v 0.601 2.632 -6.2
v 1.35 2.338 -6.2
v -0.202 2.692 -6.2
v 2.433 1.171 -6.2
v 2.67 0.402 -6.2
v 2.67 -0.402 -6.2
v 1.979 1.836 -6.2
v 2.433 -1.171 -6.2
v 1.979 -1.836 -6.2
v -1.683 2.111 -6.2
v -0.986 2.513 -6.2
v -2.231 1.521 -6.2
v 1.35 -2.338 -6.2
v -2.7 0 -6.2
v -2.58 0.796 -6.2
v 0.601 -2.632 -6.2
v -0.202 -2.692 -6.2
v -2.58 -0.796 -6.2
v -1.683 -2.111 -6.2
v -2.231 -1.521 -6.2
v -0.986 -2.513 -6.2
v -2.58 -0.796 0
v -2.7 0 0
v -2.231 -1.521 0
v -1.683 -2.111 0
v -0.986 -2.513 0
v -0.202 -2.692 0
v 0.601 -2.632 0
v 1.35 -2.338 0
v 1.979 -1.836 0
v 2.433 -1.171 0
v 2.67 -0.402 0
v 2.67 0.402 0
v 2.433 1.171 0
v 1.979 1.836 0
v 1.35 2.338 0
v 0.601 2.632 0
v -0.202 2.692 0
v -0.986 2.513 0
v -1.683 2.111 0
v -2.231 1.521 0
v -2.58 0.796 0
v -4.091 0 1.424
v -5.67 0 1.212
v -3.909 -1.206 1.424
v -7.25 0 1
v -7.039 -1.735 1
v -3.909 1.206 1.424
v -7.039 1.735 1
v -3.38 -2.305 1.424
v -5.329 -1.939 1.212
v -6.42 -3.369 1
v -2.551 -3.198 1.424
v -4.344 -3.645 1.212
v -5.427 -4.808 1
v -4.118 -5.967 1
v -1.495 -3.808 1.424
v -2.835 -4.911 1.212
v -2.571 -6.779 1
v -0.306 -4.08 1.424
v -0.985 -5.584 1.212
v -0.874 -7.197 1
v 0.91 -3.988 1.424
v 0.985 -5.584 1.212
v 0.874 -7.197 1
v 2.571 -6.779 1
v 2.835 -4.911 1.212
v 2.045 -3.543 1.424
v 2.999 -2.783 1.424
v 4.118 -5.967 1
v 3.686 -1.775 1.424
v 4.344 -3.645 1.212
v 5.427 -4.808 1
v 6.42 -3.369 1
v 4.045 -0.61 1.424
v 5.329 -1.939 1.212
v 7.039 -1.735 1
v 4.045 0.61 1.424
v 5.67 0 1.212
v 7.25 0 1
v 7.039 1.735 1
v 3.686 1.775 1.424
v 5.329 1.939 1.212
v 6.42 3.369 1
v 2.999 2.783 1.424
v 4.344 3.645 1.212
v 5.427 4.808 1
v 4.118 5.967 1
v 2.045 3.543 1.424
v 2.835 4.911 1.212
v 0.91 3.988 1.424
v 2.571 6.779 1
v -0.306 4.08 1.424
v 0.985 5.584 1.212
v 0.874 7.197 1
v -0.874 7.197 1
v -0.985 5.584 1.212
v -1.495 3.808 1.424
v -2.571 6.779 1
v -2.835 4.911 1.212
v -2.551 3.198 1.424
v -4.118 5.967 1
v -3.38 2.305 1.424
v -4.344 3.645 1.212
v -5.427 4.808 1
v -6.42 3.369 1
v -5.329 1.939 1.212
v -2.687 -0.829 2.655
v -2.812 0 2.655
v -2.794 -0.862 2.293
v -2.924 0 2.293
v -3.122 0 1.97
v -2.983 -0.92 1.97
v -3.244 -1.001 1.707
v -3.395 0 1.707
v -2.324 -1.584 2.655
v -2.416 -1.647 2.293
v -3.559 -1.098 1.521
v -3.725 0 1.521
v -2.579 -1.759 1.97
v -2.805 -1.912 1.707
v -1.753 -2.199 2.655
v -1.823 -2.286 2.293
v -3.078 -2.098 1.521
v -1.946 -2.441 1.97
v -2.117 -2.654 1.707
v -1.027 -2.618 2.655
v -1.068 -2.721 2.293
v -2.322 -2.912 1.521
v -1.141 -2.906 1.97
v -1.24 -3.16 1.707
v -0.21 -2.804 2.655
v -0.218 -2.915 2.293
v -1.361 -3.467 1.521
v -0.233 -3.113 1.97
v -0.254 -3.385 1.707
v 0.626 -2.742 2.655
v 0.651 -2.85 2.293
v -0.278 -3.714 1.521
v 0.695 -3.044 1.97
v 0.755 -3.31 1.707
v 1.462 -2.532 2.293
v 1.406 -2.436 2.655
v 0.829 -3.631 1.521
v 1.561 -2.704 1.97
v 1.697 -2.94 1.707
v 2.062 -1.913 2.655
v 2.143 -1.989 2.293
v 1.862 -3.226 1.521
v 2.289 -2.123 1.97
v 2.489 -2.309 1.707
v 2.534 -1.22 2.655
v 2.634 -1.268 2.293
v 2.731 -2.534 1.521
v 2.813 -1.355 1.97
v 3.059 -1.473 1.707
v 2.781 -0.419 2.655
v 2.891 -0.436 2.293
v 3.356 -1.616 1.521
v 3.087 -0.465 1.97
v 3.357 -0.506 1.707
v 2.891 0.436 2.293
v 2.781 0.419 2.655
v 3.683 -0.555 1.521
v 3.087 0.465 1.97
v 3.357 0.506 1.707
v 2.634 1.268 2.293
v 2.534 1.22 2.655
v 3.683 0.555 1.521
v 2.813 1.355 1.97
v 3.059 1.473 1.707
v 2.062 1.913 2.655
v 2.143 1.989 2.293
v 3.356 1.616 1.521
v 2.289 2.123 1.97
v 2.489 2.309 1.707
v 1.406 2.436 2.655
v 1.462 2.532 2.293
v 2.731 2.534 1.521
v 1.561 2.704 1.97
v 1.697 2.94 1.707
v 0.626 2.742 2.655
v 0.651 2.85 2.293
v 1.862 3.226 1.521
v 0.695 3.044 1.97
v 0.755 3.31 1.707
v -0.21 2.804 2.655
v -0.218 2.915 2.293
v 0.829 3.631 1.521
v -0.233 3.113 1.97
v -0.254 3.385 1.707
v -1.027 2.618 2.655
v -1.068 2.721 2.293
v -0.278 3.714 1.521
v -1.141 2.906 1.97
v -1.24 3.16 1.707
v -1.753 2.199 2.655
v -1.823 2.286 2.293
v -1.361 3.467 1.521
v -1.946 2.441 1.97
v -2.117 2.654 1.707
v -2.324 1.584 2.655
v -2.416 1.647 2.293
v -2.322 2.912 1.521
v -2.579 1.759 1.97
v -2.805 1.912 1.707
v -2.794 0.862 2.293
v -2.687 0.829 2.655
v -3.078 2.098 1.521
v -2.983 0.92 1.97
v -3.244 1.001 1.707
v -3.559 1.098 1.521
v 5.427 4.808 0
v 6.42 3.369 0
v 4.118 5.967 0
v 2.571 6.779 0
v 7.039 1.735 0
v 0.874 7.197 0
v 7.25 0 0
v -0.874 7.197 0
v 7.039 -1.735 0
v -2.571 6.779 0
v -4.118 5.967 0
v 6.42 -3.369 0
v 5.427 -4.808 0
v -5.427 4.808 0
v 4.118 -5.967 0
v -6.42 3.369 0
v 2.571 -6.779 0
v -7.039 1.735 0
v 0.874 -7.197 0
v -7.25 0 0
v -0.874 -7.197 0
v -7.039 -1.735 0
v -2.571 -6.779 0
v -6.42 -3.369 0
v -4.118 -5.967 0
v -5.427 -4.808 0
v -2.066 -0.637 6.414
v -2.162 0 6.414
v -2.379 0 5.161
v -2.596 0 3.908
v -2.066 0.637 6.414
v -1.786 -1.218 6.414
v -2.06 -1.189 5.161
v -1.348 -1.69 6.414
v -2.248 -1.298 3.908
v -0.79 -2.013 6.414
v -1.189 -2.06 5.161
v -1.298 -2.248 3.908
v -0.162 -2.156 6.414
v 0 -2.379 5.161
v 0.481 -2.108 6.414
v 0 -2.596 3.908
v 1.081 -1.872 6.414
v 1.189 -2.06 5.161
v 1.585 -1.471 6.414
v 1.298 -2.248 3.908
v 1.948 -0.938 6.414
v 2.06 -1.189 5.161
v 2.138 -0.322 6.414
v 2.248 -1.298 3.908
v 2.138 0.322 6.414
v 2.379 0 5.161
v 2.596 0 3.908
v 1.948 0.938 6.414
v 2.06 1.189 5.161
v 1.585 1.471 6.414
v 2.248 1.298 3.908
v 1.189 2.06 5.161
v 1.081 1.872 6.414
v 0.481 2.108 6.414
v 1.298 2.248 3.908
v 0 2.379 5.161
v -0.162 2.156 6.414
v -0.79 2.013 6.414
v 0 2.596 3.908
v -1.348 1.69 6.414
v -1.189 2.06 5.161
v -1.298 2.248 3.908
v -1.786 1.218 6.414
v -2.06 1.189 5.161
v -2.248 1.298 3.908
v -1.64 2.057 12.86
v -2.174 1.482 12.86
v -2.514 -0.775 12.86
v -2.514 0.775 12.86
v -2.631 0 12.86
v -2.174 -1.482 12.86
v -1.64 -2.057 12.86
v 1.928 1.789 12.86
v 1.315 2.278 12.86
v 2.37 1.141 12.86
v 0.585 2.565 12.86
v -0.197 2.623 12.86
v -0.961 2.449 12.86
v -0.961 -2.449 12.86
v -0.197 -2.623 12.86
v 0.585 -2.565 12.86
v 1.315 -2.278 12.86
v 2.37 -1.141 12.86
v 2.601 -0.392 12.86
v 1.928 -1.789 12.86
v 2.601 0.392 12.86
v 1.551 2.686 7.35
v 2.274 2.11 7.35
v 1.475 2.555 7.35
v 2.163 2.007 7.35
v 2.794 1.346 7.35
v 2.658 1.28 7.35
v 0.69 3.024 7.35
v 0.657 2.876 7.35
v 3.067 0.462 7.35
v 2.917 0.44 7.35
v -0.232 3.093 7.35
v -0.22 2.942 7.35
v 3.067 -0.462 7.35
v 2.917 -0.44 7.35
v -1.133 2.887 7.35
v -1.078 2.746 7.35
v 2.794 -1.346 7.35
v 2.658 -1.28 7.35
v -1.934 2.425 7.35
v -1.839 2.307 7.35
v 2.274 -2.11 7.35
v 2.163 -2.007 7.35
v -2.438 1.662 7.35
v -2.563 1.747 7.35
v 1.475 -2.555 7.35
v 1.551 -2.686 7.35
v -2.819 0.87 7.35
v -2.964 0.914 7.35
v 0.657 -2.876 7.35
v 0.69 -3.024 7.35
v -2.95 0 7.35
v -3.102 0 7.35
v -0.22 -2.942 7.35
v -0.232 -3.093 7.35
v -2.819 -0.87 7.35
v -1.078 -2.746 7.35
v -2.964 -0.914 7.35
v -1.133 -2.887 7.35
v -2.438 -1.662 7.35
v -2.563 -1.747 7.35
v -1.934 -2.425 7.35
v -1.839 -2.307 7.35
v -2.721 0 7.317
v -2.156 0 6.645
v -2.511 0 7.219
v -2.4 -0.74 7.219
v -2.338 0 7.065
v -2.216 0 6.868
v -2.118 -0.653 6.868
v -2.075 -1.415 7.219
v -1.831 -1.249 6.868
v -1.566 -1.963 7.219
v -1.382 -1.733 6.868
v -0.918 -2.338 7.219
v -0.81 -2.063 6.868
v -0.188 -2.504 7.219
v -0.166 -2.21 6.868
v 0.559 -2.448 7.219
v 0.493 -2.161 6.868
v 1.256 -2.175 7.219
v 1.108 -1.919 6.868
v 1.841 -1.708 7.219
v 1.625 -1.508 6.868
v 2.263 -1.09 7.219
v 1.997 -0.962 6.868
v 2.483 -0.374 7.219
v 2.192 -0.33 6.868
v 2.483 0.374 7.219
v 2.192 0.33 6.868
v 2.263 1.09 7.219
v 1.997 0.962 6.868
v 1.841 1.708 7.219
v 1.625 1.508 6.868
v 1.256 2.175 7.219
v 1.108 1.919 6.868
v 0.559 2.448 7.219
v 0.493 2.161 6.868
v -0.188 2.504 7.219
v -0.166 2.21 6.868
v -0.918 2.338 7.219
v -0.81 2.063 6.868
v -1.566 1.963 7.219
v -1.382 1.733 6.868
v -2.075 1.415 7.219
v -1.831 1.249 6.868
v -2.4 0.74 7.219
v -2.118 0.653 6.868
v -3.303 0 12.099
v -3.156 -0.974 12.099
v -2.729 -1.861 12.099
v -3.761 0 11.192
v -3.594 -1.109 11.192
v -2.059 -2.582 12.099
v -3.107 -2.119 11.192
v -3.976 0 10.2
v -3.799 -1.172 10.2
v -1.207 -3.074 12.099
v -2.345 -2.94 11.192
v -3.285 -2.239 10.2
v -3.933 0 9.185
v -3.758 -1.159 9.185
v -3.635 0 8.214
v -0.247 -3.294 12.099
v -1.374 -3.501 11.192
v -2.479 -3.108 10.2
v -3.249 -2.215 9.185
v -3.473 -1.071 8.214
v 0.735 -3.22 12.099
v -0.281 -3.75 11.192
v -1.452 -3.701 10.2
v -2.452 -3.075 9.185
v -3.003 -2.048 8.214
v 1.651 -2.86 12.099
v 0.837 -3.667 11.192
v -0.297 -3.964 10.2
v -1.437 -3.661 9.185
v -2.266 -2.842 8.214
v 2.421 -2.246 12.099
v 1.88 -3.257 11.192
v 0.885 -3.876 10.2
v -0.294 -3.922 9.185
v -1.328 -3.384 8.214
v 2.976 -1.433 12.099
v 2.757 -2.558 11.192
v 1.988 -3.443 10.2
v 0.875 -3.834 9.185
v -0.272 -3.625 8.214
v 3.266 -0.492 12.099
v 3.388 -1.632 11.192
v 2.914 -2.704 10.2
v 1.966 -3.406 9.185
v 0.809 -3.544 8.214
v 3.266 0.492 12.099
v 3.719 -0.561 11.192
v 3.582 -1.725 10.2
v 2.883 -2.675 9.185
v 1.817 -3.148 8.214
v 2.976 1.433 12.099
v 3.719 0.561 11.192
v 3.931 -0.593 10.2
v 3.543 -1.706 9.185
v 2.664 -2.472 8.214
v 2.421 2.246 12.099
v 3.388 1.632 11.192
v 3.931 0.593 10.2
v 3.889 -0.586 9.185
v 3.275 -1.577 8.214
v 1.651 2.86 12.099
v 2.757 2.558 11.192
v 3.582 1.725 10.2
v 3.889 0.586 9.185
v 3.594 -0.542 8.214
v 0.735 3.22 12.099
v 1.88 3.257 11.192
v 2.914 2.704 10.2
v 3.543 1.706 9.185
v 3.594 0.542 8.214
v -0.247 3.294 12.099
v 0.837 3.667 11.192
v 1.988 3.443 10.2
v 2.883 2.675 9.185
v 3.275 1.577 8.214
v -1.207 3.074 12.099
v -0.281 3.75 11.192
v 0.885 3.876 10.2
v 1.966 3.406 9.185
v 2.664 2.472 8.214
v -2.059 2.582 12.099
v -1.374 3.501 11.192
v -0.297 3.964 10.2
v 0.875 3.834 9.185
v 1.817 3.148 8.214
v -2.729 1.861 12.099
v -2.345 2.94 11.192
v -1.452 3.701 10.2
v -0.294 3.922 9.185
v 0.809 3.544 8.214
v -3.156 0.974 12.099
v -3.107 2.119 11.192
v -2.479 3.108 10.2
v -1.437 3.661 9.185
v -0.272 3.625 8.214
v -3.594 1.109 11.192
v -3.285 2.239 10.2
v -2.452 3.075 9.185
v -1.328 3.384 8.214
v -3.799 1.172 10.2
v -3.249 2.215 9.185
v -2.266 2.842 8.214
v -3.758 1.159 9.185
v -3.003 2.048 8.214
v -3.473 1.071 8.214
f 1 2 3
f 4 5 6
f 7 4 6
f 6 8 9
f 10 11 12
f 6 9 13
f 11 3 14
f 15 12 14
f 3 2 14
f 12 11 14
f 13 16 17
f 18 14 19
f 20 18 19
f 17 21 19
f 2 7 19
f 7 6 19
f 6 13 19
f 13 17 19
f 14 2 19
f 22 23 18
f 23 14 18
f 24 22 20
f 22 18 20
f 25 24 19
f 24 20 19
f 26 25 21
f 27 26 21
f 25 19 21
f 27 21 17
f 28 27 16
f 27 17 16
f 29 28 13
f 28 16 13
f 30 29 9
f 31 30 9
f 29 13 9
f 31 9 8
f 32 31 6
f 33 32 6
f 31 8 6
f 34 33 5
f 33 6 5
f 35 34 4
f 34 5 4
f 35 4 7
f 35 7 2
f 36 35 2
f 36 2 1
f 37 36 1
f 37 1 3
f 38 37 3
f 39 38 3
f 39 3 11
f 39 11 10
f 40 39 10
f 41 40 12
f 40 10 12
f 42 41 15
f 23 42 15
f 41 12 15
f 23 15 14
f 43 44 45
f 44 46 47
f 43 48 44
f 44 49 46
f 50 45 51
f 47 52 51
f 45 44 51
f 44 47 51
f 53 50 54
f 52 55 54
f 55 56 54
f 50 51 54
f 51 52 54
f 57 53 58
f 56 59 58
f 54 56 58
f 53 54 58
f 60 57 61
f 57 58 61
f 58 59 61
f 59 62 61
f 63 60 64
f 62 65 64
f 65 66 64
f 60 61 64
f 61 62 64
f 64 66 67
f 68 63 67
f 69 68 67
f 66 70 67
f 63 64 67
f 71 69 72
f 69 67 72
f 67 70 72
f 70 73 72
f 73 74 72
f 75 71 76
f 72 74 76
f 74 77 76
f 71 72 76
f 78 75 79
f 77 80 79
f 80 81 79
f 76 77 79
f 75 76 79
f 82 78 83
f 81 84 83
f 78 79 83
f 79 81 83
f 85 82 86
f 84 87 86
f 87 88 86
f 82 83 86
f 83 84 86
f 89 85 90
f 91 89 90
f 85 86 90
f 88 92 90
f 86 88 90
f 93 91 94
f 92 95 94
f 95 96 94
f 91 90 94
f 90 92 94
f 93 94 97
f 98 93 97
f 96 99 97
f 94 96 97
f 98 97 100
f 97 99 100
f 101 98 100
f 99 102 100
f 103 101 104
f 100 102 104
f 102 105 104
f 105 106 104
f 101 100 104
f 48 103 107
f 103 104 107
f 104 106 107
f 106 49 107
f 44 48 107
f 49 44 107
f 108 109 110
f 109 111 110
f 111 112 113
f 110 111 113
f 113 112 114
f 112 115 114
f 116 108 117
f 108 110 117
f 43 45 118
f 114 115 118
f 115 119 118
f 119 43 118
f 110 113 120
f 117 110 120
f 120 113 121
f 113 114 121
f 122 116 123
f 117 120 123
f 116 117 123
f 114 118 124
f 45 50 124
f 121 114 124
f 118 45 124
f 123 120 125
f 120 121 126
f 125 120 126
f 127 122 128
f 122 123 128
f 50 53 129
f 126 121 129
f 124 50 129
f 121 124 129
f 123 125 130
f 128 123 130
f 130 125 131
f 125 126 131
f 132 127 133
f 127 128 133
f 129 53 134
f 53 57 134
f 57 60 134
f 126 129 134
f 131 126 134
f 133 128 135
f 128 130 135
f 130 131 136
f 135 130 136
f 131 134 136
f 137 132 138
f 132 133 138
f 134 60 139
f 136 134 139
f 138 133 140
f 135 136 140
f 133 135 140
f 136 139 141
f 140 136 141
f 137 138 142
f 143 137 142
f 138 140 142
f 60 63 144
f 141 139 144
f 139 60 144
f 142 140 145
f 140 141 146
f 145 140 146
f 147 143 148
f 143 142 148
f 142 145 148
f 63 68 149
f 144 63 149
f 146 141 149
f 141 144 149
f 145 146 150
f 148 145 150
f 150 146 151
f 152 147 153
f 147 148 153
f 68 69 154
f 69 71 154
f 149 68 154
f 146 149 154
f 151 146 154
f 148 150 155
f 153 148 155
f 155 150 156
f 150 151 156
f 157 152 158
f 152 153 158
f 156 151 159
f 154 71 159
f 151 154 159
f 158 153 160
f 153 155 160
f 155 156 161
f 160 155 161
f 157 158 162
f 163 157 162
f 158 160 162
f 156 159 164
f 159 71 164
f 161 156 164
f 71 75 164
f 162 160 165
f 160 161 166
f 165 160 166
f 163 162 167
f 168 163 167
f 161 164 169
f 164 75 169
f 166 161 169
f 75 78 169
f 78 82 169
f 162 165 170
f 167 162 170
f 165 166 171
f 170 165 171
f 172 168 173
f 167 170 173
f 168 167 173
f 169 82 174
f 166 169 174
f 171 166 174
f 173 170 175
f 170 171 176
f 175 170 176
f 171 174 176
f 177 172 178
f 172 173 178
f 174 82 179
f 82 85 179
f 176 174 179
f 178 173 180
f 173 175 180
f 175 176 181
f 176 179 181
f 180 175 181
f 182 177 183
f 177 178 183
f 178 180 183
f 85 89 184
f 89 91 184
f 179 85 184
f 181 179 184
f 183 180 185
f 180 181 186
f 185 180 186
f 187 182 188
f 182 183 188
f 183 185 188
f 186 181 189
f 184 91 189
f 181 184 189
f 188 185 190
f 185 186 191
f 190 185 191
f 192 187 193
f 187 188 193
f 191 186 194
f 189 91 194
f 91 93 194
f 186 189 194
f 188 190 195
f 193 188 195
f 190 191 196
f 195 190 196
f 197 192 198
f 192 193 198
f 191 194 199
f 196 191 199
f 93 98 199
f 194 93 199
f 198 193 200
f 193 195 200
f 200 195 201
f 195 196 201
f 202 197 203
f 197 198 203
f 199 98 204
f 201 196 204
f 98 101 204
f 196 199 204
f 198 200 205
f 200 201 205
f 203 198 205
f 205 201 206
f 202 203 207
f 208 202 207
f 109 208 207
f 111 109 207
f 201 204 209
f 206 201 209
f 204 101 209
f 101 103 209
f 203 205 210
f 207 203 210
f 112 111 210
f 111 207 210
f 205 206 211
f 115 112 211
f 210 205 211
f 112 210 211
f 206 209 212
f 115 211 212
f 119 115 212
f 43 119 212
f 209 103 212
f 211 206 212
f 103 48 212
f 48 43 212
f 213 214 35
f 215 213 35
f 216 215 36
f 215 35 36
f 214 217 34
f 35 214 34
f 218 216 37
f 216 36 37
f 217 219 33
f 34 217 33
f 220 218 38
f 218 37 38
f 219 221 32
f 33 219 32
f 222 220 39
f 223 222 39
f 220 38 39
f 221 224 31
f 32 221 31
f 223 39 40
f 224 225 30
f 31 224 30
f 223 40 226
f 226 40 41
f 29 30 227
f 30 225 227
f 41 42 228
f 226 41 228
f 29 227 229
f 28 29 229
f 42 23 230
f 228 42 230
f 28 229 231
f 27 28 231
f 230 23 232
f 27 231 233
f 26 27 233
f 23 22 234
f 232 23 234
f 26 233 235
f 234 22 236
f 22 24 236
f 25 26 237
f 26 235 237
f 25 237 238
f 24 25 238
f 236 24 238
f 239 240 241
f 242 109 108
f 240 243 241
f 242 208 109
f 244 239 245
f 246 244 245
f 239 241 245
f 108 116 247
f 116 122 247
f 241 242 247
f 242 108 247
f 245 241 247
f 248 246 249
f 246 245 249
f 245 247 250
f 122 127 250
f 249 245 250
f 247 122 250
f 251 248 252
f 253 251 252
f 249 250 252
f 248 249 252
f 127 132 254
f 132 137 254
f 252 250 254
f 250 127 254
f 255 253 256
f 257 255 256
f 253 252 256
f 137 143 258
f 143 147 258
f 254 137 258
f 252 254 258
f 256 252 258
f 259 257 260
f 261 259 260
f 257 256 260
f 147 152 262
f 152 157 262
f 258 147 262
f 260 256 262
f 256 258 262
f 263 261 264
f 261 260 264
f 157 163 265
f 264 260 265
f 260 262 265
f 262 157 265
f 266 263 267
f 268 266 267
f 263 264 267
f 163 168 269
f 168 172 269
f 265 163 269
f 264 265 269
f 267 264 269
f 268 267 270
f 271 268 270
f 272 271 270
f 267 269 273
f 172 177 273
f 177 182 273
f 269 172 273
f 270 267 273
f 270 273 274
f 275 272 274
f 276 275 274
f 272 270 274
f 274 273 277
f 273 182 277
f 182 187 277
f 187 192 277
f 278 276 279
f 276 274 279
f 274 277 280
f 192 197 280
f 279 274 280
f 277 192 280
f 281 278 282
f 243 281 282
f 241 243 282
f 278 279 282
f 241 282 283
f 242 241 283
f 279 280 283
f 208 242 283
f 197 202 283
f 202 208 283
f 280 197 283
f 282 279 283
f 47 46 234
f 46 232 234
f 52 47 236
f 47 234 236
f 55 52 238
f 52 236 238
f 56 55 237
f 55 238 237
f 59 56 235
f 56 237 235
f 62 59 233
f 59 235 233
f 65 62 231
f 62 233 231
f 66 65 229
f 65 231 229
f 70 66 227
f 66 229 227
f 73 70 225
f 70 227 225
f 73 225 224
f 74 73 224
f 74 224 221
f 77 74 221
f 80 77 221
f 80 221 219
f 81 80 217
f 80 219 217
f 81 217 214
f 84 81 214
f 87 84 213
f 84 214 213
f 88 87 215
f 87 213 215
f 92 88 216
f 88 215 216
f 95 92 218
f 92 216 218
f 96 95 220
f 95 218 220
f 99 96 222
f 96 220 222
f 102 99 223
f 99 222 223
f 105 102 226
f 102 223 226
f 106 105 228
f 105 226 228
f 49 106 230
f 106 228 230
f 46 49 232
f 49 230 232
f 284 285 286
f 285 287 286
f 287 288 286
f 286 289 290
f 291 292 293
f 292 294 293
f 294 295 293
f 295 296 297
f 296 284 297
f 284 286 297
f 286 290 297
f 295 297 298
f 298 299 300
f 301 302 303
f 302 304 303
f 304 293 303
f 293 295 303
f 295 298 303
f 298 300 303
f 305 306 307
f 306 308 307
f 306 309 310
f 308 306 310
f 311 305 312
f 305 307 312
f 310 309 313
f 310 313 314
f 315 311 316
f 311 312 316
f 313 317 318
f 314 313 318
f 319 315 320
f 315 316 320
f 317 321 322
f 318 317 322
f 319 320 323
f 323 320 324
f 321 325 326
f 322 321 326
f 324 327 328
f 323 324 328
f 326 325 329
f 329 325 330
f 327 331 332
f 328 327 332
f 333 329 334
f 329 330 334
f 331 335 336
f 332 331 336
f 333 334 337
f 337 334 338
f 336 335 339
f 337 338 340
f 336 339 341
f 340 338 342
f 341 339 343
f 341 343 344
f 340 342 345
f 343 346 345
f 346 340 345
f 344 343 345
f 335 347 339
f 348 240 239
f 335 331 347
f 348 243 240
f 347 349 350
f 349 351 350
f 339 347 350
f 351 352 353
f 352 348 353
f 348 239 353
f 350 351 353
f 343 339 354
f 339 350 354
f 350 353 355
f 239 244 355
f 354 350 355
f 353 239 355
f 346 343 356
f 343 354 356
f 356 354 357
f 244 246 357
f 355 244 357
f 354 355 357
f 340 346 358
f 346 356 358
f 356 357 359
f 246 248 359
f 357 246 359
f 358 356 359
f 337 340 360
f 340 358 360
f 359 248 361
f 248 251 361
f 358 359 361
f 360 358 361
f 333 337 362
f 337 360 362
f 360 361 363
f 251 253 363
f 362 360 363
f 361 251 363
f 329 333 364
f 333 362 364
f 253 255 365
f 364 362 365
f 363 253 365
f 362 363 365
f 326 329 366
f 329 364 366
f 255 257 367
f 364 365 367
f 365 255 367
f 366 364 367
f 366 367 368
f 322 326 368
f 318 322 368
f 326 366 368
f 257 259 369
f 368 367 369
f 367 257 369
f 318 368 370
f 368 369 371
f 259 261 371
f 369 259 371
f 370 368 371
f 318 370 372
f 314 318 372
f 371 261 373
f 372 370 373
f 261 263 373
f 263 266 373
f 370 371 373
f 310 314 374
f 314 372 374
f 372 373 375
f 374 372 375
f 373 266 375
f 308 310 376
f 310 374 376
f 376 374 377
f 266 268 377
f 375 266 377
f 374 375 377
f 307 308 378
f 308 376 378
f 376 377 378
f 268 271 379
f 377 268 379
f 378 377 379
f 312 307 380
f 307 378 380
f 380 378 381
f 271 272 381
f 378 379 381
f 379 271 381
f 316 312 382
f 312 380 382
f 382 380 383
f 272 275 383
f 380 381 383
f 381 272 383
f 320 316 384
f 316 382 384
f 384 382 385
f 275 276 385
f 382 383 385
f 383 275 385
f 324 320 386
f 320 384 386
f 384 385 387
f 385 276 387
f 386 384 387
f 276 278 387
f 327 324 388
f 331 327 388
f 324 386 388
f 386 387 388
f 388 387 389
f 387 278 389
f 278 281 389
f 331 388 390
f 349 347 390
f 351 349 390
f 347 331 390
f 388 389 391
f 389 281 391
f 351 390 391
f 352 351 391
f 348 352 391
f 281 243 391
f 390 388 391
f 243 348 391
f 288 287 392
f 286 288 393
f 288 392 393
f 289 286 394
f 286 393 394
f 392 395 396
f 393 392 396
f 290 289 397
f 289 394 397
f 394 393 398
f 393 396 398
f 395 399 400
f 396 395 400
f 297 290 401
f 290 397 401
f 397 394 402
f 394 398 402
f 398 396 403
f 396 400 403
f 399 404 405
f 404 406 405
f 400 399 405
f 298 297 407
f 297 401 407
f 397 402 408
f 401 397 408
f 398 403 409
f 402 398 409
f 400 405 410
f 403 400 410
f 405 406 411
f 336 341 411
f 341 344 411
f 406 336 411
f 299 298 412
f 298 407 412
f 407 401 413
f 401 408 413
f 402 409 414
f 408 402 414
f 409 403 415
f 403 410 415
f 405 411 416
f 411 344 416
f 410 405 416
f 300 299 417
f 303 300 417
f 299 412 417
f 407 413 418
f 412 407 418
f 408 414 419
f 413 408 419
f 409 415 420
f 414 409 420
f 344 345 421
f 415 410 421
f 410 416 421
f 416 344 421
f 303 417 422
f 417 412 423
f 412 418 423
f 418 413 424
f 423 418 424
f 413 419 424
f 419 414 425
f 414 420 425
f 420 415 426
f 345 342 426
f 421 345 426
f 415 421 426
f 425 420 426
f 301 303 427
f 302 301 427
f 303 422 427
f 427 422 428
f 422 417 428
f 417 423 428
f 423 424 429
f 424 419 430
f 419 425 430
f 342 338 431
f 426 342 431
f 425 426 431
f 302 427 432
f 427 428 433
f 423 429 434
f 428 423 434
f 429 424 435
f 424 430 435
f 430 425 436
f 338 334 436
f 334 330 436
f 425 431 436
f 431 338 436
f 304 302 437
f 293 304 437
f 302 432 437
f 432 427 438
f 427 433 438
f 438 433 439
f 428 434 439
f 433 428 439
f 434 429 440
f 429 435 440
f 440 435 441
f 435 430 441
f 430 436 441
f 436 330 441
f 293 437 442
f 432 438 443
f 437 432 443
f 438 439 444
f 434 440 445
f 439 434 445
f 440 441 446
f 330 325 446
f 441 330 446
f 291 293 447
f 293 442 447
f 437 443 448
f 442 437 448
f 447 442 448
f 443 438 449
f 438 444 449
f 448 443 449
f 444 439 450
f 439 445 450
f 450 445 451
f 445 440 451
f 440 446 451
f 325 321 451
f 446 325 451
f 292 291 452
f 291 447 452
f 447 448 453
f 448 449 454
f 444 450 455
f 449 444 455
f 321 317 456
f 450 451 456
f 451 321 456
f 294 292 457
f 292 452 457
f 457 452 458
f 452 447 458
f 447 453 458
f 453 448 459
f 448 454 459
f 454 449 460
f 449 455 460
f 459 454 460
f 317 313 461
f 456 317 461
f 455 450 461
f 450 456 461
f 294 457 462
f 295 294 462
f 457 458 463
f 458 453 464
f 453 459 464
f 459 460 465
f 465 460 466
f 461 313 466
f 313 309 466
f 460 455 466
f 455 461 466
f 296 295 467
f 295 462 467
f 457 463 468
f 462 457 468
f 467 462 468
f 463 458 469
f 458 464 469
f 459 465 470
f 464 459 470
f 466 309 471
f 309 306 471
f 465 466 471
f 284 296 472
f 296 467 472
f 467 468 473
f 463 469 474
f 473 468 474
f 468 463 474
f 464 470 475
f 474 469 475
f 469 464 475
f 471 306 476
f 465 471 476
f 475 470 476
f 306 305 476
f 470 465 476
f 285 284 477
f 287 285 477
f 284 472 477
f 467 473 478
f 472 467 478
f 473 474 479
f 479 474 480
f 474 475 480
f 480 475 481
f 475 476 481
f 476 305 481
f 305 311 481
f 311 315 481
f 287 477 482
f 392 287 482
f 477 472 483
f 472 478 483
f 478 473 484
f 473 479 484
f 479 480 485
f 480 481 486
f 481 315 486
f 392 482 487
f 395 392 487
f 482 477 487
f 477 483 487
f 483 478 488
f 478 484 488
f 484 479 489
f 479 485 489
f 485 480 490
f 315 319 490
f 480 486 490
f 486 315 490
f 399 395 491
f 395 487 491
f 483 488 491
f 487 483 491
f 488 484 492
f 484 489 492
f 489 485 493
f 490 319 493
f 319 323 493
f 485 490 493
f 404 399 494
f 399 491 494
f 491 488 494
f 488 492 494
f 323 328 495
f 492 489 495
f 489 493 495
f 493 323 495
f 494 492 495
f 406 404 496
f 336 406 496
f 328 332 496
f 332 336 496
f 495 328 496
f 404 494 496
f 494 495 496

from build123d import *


with BuildPart() as f1:
    # F0 (on Front) → F1 (revolve)
    with BuildSketch(Plane.XZ):
        with BuildLine():
            Line((-2.7, -6.2), (0, -6.2))
            Line((0, -6.2), (0, 12.86))
            Line((0, 12.86), (-2.630608, 12.86))
            ThreePointArc((-2.630608, 12.86), (-3.975502, 10.199833), (-3.101612, 7.35))
            Line((-3.101612, 7.35), (-2.950293, 7.35))
            ThreePointArc((-2.950293, 7.35), (-2.338286, 7.065216), (-2.162004, 6.413618))
            Line((-2.162004, 6.413618), (-2.812344, 2.65465))
            ThreePointArc((-2.812344, 2.65465), (-3.250065, 1.829751), (-4.090995, 1.423678))
            Line((-4.090995, 1.423678), (-7.25, 1))
            Line((-7.25, 1), (-7.25, 0))
            Line((-7.25, 0), (-2.7, 0))
            Line((-2.7, 0), (-2.7, -6.2))
        make_face()
    revolve(axis=Axis((0, 0, 1.878261), (0, 0, 1)))


solid = f1.part
